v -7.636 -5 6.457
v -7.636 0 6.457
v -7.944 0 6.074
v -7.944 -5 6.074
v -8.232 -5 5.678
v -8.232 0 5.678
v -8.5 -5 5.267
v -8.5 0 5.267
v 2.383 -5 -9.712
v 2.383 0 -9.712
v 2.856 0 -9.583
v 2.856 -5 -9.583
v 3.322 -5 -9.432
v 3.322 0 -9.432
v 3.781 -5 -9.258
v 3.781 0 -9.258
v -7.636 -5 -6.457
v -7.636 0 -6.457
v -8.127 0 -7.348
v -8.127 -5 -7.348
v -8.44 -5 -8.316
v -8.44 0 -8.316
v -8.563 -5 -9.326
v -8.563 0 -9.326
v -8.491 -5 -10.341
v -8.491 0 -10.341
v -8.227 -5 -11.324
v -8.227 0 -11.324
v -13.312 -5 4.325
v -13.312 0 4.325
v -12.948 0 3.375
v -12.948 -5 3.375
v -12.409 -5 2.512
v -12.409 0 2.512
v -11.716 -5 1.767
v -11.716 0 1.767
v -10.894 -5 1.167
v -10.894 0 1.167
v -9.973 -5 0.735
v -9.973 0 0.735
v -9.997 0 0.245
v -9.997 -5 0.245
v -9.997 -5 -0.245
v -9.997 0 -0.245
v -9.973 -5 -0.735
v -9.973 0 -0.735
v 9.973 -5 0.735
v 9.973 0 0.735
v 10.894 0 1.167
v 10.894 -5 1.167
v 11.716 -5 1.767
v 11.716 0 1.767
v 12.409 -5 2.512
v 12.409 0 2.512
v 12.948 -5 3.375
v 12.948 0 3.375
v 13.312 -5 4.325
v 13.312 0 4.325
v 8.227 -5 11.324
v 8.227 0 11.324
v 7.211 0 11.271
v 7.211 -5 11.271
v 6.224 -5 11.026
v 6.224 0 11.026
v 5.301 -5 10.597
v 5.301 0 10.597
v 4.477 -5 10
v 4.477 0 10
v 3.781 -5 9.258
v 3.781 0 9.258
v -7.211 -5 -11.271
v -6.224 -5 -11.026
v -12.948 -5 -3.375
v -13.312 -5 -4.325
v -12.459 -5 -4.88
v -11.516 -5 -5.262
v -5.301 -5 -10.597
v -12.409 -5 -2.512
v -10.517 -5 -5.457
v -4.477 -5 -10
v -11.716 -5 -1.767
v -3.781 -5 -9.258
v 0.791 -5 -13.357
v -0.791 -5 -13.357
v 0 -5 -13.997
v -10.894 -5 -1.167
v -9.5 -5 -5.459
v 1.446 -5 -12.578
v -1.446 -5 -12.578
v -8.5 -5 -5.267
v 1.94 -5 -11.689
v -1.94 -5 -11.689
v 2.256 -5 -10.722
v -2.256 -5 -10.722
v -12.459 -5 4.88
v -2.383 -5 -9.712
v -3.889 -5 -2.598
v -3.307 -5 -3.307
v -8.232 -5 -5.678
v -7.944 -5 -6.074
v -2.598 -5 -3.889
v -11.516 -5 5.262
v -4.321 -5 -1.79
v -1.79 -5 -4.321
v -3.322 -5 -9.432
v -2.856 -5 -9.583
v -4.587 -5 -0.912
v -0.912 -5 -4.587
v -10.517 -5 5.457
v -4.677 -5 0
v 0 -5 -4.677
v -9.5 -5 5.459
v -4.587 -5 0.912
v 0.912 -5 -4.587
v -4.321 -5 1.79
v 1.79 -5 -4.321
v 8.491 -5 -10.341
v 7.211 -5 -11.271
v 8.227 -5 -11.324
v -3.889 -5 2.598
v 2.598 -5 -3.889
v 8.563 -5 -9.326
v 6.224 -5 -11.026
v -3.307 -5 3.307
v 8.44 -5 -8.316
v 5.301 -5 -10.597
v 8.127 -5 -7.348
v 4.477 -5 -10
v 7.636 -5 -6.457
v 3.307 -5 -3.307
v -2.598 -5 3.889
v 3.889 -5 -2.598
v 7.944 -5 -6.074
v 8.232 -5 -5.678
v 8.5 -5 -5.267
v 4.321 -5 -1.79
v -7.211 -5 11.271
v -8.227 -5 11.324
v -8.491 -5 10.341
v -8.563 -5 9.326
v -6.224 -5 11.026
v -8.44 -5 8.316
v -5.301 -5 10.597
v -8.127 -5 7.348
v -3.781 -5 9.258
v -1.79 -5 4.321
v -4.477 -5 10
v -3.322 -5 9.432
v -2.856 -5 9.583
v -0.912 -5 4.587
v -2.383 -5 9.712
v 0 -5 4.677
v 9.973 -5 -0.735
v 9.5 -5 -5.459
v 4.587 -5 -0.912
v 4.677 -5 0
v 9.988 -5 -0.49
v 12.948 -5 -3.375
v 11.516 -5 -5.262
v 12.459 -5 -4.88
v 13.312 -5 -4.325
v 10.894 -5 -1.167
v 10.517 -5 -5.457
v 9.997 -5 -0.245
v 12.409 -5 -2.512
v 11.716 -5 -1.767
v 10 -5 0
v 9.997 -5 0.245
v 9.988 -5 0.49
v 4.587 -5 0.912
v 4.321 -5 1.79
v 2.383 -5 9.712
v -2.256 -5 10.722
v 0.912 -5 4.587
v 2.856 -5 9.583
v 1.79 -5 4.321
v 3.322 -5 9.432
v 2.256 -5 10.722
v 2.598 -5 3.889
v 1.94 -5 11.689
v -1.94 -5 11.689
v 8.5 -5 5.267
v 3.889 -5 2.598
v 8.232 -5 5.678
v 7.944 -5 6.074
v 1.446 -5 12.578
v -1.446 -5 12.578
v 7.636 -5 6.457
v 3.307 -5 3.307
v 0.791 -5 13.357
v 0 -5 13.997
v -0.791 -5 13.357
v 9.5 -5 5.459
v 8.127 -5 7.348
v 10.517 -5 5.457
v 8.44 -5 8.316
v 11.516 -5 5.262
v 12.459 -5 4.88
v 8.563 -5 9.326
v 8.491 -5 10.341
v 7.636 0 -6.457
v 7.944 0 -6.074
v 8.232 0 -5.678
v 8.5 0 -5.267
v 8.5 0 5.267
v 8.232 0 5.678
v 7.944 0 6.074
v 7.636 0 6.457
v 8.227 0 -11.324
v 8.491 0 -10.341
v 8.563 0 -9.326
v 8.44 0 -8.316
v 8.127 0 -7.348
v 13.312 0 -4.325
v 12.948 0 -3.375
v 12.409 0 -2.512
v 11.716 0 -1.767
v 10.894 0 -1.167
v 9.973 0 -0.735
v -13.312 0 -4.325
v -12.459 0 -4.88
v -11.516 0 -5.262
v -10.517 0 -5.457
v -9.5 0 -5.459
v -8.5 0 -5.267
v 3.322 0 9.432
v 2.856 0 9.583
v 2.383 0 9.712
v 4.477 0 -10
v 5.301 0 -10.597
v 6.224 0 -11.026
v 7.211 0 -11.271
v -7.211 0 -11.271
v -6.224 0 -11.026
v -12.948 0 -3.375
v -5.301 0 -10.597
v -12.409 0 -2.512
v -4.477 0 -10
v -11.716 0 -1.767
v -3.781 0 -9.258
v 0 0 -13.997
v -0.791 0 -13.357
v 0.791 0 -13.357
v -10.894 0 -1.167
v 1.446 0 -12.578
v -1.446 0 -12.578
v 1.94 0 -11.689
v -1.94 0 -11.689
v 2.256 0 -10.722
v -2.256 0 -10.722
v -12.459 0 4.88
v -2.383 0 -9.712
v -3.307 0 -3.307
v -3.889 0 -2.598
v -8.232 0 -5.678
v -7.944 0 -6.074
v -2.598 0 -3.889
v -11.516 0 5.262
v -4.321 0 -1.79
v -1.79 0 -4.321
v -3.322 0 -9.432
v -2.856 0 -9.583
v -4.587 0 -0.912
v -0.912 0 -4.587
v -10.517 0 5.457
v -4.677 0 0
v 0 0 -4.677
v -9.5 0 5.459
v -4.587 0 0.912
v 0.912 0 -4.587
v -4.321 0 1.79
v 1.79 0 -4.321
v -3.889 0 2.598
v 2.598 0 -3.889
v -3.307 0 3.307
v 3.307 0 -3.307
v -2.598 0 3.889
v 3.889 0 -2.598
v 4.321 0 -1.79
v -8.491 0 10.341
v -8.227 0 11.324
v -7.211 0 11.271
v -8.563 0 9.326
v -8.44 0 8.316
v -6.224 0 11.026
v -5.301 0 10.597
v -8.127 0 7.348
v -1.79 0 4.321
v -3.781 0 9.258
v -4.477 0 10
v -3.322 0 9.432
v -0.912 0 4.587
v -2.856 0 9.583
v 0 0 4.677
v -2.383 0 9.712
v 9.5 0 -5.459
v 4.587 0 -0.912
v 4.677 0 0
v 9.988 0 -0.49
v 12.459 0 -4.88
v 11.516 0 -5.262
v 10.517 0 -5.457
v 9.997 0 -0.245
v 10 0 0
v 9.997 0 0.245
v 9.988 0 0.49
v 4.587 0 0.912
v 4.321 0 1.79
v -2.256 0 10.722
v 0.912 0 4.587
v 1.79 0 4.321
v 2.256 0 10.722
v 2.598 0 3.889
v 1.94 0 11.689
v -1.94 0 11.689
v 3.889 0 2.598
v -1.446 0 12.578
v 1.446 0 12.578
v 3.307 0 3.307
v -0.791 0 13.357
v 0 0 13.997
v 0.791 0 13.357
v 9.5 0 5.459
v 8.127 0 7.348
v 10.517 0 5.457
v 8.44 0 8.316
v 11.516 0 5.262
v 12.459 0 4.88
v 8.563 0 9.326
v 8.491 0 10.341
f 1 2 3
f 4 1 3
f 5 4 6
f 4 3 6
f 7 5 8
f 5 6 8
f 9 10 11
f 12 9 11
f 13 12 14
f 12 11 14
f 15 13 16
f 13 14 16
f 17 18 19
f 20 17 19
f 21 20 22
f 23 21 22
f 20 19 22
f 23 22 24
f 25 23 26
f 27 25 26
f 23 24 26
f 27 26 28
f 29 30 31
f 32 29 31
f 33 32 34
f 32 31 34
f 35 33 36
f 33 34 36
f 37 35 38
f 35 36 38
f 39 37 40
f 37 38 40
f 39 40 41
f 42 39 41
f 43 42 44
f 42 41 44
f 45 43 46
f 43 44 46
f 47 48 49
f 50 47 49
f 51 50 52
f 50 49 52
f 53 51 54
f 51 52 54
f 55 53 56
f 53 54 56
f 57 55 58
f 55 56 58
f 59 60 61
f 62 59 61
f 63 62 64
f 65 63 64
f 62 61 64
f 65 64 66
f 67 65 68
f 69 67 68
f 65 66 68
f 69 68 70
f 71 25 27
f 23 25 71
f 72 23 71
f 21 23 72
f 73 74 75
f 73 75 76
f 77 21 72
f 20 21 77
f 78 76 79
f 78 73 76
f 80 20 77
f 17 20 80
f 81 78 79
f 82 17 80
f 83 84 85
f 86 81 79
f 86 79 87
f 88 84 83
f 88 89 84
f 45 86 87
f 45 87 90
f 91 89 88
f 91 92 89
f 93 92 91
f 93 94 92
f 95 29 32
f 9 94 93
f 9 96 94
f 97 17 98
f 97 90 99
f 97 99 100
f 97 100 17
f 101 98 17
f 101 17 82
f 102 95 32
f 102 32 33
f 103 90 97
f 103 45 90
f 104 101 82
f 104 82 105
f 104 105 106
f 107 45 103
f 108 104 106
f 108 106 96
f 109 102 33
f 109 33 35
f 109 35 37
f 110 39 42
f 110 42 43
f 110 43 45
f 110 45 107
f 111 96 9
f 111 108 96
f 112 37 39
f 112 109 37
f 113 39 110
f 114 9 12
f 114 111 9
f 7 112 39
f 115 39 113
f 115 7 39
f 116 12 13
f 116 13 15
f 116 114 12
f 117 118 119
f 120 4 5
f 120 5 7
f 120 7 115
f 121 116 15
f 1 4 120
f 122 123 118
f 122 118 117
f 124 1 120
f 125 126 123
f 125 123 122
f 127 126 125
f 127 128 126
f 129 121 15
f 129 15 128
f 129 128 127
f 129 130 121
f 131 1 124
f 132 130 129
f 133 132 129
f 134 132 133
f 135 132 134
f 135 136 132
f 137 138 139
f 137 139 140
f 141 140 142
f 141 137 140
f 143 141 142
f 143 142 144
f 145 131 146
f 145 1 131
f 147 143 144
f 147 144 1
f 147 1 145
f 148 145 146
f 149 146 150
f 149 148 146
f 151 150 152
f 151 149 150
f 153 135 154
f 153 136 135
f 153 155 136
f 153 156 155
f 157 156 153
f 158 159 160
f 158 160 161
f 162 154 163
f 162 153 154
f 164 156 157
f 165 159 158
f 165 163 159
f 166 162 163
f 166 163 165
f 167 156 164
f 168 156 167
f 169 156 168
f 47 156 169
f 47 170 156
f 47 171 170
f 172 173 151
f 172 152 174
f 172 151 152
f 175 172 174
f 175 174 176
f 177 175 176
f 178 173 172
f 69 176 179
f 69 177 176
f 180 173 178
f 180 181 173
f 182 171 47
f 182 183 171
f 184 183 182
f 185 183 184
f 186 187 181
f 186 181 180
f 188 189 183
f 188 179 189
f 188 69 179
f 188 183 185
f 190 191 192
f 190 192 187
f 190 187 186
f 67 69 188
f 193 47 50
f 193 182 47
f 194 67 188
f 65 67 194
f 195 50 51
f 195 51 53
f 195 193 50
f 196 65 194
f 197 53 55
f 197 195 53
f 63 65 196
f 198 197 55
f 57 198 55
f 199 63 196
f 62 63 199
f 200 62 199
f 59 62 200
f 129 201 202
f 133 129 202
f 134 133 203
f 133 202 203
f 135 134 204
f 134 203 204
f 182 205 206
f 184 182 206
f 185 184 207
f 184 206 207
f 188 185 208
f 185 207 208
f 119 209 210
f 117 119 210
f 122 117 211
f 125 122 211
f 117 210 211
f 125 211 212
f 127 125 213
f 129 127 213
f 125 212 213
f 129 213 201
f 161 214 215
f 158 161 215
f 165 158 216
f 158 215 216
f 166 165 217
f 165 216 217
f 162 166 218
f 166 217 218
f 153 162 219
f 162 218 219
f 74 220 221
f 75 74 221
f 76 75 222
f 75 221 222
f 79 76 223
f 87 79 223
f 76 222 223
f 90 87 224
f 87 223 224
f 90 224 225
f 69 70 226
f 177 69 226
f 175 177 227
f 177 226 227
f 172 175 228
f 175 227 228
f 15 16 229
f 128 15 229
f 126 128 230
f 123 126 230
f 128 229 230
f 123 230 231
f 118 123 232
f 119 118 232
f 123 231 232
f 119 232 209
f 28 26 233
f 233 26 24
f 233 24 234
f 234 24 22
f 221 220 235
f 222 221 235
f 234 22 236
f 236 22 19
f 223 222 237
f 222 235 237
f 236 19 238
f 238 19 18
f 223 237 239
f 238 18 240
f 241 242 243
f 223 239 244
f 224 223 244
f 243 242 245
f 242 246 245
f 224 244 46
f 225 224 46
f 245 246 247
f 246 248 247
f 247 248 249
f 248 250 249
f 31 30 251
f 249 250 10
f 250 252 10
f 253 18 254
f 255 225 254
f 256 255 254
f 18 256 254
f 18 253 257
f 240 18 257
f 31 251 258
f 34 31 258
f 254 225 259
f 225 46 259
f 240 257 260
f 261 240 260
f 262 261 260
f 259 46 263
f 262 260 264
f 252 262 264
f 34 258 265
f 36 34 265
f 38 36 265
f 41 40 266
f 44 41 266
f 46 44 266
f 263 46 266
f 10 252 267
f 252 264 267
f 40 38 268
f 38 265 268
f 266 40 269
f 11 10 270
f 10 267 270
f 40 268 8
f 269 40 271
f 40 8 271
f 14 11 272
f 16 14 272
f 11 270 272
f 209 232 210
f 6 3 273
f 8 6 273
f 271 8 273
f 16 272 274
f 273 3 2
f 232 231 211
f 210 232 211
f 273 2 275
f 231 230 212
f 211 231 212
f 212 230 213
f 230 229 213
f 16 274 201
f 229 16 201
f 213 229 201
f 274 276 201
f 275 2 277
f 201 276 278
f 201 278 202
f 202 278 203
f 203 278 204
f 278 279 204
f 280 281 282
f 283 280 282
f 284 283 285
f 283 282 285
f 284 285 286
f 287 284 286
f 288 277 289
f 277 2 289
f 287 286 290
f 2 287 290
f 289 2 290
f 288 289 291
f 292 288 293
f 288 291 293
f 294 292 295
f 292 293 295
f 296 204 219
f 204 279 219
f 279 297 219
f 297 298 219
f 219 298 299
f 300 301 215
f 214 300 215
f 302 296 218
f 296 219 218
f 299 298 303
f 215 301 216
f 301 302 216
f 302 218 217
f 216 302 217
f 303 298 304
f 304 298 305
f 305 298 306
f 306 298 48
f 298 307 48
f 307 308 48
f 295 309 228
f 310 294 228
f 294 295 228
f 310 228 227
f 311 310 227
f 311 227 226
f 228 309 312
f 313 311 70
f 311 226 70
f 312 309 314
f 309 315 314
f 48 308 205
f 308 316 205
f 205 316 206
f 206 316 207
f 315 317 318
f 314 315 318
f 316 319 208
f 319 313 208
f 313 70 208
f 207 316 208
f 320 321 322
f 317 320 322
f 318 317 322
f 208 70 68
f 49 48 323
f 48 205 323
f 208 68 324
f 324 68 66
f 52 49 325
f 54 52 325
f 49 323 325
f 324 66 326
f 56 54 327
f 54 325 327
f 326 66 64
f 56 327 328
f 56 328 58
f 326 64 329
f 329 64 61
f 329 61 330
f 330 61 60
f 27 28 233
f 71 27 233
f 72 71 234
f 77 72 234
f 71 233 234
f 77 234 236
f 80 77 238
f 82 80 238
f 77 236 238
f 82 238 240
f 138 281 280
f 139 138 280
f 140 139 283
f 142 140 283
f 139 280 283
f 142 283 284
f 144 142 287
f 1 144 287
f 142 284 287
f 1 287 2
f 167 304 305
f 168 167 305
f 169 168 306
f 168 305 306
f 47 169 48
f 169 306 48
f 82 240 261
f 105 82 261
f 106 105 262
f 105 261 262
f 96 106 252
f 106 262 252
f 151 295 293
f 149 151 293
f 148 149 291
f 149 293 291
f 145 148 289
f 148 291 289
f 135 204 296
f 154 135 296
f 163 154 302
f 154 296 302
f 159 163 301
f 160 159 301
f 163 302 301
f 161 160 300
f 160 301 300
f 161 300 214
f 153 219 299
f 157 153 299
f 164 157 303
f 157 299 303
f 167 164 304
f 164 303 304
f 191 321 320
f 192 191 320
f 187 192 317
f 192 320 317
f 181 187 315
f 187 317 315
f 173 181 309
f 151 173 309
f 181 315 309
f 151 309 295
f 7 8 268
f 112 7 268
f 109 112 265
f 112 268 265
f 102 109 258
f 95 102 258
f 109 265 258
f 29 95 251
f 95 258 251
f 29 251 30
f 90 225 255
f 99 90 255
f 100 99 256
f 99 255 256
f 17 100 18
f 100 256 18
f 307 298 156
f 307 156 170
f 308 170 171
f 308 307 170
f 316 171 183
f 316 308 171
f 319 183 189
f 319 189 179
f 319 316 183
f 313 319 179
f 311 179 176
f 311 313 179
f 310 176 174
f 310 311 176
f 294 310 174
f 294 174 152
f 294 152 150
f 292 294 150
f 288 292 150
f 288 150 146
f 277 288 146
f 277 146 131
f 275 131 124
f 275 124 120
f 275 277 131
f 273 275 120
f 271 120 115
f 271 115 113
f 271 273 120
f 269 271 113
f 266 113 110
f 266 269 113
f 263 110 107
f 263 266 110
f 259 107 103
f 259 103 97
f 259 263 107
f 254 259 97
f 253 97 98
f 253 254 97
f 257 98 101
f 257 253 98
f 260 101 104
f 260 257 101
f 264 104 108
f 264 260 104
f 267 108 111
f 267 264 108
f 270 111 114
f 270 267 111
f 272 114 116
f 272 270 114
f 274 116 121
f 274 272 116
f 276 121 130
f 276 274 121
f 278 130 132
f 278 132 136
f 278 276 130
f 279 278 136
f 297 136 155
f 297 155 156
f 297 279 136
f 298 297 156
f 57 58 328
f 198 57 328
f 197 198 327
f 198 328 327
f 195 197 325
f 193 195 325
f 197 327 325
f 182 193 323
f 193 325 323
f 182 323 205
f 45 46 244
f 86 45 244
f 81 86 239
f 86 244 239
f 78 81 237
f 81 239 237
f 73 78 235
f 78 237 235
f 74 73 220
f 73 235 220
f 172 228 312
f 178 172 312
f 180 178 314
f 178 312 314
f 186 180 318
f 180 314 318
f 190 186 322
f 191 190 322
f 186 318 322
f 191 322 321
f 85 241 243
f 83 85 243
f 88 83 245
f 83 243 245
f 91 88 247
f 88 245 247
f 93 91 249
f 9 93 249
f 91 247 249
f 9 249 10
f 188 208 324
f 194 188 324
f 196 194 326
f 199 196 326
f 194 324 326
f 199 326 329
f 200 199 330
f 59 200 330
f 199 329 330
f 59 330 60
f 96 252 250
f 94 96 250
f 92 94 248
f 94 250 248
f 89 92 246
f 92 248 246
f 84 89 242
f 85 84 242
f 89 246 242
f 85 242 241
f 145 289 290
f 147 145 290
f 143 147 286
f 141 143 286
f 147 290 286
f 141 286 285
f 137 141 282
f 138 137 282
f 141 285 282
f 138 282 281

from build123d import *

# Parameters (mm, degrees)
F0_R     = 4.677056
F1_DEPTH = 5


with BuildPart() as f1:
    # F0 (on Front) → F1 (new body)
    with BuildSketch(Plane.XZ):
        with BuildLine():
            ThreePointArc((8.500315, 5.267318), (9.510565, 3.09017), (9.972951, 0.73501))
            ThreePointArc((9.972951, 0.73501), (12.080664, 2.122816), (13.312307, 4.325431))
            ThreePointArc((13.312307, 4.325431), (11.021222, 5.383442), (8.500315, 5.267318))
        make_face()
        with BuildLine():
            ThreePointArc((3.780847, 9.25771), (5.877853, 8.09017), (7.636259, 6.456589))
            ThreePointArc((7.636259, 6.456589), (8.525703, 8.81823), (8.227458, 11.324125))
            ThreePointArc((8.227458, 11.324125), (5.752048, 10.833408), (3.780847, 9.25771))
        make_face()
        with BuildLine():
            ThreePointArc((-2.382776, 9.711971), (0, 10), (2.382776, 9.711971))
            ThreePointArc((2.382776, 9.711971), (1.714213, 12.145381), (0, 13.997388))
            ThreePointArc((0, 13.997388), (-1.714213, 12.145381), (-2.382776, 9.711971))
        make_face()
        with BuildLine():
            ThreePointArc((-7.636259, 6.456589), (-5.877853, 8.09017), (-3.780847, 9.25771))
            ThreePointArc((-3.780847, 9.25771), (-5.752048, 10.833408), (-8.227458, 11.324125))
            ThreePointArc((-8.227458, 11.324125), (-8.525703, 8.81823), (-7.636259, 6.456589))
        make_face()
        with BuildLine():
            ThreePointArc((-9.972951, 0.73501), (-9.510565, 3.09017), (-8.500315, 5.267318))
            ThreePointArc((-8.500315, 5.267318), (-11.021222, 5.383442), (-13.312307, 4.325431))
            ThreePointArc((-13.312307, 4.325431), (-12.080664, 2.122816), (-9.972951, 0.73501))
        make_face()
        with BuildLine():
            ThreePointArc((-13.312307, -4.325431), (-11.021222, -5.383442), (-8.500315, -5.267318))
            ThreePointArc((-8.500315, -5.267318), (-9.510565, -3.09017), (-9.972951, -0.73501))
            ThreePointArc((-9.972951, -0.73501), (-12.080664, -2.122816), (-13.312307, -4.325431))
        make_face()
        with BuildLine():
            ThreePointArc((-8.227458, -11.324125), (-5.752048, -10.833408), (-3.780847, -9.25771))
            ThreePointArc((-3.780847, -9.25771), (-5.877853, -8.09017), (-7.636259, -6.456589))
            ThreePointArc((-7.636259, -6.456589), (-8.525703, -8.81823), (-8.227458, -11.324125))
        make_face()
        with BuildLine():
            ThreePointArc((0, -13.997388), (1.714213, -12.145381), (2.382776, -9.711971))
            ThreePointArc((2.382776, -9.711971), (0, -10), (-2.382776, -9.711971))
            ThreePointArc((-2.382776, -9.711971), (-1.714213, -12.145381), (0, -13.997388))
        make_face()
        with BuildLine():
            ThreePointArc((8.227458, -11.324125), (8.525703, -8.81823), (7.636259, -6.456589))
            ThreePointArc((7.636259, -6.456589), (5.877853, -8.09017), (3.780847, -9.25771))
            ThreePointArc((3.780847, -9.25771), (5.752048, -10.833408), (8.227458, -11.324125))
        make_face()
        with BuildLine():
            ThreePointArc((13.312307, -4.325431), (12.080664, -2.122816), (9.972951, -0.73501))
            ThreePointArc((9.972951, -0.73501), (9.510565, -3.09017), (8.500315, -5.267318))
            ThreePointArc((8.500315, -5.267318), (11.021222, -5.383442), (13.312307, -4.325431))
        make_face()
        with BuildLine():
            ThreePointArc((9.972951, -0.73501), (9.993236, -0.367754), (10, 0))
            ThreePointArc((10, 0), (9.993236, 0.367754), (9.972951, 0.73501))
            ThreePointArc((9.972951, 0.73501), (9.510565, 3.09017), (8.500315, 5.267318))
            ThreePointArc((8.500315, 5.267318), (8.09017, 5.877853), (7.636259, 6.456589))
            ThreePointArc((7.636259, 6.456589), (5.877853, 8.09017), (3.780847, 9.25771))
            ThreePointArc((3.780847, 9.25771), (3.09017, 9.510565), (2.382776, 9.711971))
            ThreePointArc((2.382776, 9.711971), (0, 10), (-2.382776, 9.711971))
            ThreePointArc((-2.382776, 9.711971), (-3.09017, 9.510565), (-3.780847, 9.25771))
            ThreePointArc((-3.780847, 9.25771), (-5.877853, 8.09017), (-7.636259, 6.456589))
            ThreePointArc((-7.636259, 6.456589), (-8.09017, 5.877853), (-8.500315, 5.267318))
            ThreePointArc((-8.500315, 5.267318), (-9.510565, 3.09017), (-9.972951, 0.73501))
            ThreePointArc((-9.972951, 0.73501), (-10, 0), (-9.972951, -0.73501))
            ThreePointArc((-9.972951, -0.73501), (-9.510565, -3.09017), (-8.500315, -5.267318))
            ThreePointArc((-8.500315, -5.267318), (-8.09017, -5.877853), (-7.636259, -6.456589))
            ThreePointArc((-7.636259, -6.456589), (-5.877853, -8.09017), (-3.780847, -9.25771))
            ThreePointArc((-3.780847, -9.25771), (-3.09017, -9.510565), (-2.382776, -9.711971))
            ThreePointArc((-2.382776, -9.711971), (0, -10), (2.382776, -9.711971))
            ThreePointArc((2.382776, -9.711971), (3.09017, -9.510565), (3.780847, -9.25771))
            ThreePointArc((3.780847, -9.25771), (5.877853, -8.09017), (7.636259, -6.456589))
            ThreePointArc((7.636259, -6.456589), (8.09017, -5.877853), (8.500315, -5.267318))
            ThreePointArc((8.500315, -5.267318), (9.510565, -3.09017), (9.972951, -0.73501))
        make_face()
        Circle(F0_R, mode=Mode.SUBTRACT)
    extrude(amount=F1_DEPTH)


solid = f1.part
